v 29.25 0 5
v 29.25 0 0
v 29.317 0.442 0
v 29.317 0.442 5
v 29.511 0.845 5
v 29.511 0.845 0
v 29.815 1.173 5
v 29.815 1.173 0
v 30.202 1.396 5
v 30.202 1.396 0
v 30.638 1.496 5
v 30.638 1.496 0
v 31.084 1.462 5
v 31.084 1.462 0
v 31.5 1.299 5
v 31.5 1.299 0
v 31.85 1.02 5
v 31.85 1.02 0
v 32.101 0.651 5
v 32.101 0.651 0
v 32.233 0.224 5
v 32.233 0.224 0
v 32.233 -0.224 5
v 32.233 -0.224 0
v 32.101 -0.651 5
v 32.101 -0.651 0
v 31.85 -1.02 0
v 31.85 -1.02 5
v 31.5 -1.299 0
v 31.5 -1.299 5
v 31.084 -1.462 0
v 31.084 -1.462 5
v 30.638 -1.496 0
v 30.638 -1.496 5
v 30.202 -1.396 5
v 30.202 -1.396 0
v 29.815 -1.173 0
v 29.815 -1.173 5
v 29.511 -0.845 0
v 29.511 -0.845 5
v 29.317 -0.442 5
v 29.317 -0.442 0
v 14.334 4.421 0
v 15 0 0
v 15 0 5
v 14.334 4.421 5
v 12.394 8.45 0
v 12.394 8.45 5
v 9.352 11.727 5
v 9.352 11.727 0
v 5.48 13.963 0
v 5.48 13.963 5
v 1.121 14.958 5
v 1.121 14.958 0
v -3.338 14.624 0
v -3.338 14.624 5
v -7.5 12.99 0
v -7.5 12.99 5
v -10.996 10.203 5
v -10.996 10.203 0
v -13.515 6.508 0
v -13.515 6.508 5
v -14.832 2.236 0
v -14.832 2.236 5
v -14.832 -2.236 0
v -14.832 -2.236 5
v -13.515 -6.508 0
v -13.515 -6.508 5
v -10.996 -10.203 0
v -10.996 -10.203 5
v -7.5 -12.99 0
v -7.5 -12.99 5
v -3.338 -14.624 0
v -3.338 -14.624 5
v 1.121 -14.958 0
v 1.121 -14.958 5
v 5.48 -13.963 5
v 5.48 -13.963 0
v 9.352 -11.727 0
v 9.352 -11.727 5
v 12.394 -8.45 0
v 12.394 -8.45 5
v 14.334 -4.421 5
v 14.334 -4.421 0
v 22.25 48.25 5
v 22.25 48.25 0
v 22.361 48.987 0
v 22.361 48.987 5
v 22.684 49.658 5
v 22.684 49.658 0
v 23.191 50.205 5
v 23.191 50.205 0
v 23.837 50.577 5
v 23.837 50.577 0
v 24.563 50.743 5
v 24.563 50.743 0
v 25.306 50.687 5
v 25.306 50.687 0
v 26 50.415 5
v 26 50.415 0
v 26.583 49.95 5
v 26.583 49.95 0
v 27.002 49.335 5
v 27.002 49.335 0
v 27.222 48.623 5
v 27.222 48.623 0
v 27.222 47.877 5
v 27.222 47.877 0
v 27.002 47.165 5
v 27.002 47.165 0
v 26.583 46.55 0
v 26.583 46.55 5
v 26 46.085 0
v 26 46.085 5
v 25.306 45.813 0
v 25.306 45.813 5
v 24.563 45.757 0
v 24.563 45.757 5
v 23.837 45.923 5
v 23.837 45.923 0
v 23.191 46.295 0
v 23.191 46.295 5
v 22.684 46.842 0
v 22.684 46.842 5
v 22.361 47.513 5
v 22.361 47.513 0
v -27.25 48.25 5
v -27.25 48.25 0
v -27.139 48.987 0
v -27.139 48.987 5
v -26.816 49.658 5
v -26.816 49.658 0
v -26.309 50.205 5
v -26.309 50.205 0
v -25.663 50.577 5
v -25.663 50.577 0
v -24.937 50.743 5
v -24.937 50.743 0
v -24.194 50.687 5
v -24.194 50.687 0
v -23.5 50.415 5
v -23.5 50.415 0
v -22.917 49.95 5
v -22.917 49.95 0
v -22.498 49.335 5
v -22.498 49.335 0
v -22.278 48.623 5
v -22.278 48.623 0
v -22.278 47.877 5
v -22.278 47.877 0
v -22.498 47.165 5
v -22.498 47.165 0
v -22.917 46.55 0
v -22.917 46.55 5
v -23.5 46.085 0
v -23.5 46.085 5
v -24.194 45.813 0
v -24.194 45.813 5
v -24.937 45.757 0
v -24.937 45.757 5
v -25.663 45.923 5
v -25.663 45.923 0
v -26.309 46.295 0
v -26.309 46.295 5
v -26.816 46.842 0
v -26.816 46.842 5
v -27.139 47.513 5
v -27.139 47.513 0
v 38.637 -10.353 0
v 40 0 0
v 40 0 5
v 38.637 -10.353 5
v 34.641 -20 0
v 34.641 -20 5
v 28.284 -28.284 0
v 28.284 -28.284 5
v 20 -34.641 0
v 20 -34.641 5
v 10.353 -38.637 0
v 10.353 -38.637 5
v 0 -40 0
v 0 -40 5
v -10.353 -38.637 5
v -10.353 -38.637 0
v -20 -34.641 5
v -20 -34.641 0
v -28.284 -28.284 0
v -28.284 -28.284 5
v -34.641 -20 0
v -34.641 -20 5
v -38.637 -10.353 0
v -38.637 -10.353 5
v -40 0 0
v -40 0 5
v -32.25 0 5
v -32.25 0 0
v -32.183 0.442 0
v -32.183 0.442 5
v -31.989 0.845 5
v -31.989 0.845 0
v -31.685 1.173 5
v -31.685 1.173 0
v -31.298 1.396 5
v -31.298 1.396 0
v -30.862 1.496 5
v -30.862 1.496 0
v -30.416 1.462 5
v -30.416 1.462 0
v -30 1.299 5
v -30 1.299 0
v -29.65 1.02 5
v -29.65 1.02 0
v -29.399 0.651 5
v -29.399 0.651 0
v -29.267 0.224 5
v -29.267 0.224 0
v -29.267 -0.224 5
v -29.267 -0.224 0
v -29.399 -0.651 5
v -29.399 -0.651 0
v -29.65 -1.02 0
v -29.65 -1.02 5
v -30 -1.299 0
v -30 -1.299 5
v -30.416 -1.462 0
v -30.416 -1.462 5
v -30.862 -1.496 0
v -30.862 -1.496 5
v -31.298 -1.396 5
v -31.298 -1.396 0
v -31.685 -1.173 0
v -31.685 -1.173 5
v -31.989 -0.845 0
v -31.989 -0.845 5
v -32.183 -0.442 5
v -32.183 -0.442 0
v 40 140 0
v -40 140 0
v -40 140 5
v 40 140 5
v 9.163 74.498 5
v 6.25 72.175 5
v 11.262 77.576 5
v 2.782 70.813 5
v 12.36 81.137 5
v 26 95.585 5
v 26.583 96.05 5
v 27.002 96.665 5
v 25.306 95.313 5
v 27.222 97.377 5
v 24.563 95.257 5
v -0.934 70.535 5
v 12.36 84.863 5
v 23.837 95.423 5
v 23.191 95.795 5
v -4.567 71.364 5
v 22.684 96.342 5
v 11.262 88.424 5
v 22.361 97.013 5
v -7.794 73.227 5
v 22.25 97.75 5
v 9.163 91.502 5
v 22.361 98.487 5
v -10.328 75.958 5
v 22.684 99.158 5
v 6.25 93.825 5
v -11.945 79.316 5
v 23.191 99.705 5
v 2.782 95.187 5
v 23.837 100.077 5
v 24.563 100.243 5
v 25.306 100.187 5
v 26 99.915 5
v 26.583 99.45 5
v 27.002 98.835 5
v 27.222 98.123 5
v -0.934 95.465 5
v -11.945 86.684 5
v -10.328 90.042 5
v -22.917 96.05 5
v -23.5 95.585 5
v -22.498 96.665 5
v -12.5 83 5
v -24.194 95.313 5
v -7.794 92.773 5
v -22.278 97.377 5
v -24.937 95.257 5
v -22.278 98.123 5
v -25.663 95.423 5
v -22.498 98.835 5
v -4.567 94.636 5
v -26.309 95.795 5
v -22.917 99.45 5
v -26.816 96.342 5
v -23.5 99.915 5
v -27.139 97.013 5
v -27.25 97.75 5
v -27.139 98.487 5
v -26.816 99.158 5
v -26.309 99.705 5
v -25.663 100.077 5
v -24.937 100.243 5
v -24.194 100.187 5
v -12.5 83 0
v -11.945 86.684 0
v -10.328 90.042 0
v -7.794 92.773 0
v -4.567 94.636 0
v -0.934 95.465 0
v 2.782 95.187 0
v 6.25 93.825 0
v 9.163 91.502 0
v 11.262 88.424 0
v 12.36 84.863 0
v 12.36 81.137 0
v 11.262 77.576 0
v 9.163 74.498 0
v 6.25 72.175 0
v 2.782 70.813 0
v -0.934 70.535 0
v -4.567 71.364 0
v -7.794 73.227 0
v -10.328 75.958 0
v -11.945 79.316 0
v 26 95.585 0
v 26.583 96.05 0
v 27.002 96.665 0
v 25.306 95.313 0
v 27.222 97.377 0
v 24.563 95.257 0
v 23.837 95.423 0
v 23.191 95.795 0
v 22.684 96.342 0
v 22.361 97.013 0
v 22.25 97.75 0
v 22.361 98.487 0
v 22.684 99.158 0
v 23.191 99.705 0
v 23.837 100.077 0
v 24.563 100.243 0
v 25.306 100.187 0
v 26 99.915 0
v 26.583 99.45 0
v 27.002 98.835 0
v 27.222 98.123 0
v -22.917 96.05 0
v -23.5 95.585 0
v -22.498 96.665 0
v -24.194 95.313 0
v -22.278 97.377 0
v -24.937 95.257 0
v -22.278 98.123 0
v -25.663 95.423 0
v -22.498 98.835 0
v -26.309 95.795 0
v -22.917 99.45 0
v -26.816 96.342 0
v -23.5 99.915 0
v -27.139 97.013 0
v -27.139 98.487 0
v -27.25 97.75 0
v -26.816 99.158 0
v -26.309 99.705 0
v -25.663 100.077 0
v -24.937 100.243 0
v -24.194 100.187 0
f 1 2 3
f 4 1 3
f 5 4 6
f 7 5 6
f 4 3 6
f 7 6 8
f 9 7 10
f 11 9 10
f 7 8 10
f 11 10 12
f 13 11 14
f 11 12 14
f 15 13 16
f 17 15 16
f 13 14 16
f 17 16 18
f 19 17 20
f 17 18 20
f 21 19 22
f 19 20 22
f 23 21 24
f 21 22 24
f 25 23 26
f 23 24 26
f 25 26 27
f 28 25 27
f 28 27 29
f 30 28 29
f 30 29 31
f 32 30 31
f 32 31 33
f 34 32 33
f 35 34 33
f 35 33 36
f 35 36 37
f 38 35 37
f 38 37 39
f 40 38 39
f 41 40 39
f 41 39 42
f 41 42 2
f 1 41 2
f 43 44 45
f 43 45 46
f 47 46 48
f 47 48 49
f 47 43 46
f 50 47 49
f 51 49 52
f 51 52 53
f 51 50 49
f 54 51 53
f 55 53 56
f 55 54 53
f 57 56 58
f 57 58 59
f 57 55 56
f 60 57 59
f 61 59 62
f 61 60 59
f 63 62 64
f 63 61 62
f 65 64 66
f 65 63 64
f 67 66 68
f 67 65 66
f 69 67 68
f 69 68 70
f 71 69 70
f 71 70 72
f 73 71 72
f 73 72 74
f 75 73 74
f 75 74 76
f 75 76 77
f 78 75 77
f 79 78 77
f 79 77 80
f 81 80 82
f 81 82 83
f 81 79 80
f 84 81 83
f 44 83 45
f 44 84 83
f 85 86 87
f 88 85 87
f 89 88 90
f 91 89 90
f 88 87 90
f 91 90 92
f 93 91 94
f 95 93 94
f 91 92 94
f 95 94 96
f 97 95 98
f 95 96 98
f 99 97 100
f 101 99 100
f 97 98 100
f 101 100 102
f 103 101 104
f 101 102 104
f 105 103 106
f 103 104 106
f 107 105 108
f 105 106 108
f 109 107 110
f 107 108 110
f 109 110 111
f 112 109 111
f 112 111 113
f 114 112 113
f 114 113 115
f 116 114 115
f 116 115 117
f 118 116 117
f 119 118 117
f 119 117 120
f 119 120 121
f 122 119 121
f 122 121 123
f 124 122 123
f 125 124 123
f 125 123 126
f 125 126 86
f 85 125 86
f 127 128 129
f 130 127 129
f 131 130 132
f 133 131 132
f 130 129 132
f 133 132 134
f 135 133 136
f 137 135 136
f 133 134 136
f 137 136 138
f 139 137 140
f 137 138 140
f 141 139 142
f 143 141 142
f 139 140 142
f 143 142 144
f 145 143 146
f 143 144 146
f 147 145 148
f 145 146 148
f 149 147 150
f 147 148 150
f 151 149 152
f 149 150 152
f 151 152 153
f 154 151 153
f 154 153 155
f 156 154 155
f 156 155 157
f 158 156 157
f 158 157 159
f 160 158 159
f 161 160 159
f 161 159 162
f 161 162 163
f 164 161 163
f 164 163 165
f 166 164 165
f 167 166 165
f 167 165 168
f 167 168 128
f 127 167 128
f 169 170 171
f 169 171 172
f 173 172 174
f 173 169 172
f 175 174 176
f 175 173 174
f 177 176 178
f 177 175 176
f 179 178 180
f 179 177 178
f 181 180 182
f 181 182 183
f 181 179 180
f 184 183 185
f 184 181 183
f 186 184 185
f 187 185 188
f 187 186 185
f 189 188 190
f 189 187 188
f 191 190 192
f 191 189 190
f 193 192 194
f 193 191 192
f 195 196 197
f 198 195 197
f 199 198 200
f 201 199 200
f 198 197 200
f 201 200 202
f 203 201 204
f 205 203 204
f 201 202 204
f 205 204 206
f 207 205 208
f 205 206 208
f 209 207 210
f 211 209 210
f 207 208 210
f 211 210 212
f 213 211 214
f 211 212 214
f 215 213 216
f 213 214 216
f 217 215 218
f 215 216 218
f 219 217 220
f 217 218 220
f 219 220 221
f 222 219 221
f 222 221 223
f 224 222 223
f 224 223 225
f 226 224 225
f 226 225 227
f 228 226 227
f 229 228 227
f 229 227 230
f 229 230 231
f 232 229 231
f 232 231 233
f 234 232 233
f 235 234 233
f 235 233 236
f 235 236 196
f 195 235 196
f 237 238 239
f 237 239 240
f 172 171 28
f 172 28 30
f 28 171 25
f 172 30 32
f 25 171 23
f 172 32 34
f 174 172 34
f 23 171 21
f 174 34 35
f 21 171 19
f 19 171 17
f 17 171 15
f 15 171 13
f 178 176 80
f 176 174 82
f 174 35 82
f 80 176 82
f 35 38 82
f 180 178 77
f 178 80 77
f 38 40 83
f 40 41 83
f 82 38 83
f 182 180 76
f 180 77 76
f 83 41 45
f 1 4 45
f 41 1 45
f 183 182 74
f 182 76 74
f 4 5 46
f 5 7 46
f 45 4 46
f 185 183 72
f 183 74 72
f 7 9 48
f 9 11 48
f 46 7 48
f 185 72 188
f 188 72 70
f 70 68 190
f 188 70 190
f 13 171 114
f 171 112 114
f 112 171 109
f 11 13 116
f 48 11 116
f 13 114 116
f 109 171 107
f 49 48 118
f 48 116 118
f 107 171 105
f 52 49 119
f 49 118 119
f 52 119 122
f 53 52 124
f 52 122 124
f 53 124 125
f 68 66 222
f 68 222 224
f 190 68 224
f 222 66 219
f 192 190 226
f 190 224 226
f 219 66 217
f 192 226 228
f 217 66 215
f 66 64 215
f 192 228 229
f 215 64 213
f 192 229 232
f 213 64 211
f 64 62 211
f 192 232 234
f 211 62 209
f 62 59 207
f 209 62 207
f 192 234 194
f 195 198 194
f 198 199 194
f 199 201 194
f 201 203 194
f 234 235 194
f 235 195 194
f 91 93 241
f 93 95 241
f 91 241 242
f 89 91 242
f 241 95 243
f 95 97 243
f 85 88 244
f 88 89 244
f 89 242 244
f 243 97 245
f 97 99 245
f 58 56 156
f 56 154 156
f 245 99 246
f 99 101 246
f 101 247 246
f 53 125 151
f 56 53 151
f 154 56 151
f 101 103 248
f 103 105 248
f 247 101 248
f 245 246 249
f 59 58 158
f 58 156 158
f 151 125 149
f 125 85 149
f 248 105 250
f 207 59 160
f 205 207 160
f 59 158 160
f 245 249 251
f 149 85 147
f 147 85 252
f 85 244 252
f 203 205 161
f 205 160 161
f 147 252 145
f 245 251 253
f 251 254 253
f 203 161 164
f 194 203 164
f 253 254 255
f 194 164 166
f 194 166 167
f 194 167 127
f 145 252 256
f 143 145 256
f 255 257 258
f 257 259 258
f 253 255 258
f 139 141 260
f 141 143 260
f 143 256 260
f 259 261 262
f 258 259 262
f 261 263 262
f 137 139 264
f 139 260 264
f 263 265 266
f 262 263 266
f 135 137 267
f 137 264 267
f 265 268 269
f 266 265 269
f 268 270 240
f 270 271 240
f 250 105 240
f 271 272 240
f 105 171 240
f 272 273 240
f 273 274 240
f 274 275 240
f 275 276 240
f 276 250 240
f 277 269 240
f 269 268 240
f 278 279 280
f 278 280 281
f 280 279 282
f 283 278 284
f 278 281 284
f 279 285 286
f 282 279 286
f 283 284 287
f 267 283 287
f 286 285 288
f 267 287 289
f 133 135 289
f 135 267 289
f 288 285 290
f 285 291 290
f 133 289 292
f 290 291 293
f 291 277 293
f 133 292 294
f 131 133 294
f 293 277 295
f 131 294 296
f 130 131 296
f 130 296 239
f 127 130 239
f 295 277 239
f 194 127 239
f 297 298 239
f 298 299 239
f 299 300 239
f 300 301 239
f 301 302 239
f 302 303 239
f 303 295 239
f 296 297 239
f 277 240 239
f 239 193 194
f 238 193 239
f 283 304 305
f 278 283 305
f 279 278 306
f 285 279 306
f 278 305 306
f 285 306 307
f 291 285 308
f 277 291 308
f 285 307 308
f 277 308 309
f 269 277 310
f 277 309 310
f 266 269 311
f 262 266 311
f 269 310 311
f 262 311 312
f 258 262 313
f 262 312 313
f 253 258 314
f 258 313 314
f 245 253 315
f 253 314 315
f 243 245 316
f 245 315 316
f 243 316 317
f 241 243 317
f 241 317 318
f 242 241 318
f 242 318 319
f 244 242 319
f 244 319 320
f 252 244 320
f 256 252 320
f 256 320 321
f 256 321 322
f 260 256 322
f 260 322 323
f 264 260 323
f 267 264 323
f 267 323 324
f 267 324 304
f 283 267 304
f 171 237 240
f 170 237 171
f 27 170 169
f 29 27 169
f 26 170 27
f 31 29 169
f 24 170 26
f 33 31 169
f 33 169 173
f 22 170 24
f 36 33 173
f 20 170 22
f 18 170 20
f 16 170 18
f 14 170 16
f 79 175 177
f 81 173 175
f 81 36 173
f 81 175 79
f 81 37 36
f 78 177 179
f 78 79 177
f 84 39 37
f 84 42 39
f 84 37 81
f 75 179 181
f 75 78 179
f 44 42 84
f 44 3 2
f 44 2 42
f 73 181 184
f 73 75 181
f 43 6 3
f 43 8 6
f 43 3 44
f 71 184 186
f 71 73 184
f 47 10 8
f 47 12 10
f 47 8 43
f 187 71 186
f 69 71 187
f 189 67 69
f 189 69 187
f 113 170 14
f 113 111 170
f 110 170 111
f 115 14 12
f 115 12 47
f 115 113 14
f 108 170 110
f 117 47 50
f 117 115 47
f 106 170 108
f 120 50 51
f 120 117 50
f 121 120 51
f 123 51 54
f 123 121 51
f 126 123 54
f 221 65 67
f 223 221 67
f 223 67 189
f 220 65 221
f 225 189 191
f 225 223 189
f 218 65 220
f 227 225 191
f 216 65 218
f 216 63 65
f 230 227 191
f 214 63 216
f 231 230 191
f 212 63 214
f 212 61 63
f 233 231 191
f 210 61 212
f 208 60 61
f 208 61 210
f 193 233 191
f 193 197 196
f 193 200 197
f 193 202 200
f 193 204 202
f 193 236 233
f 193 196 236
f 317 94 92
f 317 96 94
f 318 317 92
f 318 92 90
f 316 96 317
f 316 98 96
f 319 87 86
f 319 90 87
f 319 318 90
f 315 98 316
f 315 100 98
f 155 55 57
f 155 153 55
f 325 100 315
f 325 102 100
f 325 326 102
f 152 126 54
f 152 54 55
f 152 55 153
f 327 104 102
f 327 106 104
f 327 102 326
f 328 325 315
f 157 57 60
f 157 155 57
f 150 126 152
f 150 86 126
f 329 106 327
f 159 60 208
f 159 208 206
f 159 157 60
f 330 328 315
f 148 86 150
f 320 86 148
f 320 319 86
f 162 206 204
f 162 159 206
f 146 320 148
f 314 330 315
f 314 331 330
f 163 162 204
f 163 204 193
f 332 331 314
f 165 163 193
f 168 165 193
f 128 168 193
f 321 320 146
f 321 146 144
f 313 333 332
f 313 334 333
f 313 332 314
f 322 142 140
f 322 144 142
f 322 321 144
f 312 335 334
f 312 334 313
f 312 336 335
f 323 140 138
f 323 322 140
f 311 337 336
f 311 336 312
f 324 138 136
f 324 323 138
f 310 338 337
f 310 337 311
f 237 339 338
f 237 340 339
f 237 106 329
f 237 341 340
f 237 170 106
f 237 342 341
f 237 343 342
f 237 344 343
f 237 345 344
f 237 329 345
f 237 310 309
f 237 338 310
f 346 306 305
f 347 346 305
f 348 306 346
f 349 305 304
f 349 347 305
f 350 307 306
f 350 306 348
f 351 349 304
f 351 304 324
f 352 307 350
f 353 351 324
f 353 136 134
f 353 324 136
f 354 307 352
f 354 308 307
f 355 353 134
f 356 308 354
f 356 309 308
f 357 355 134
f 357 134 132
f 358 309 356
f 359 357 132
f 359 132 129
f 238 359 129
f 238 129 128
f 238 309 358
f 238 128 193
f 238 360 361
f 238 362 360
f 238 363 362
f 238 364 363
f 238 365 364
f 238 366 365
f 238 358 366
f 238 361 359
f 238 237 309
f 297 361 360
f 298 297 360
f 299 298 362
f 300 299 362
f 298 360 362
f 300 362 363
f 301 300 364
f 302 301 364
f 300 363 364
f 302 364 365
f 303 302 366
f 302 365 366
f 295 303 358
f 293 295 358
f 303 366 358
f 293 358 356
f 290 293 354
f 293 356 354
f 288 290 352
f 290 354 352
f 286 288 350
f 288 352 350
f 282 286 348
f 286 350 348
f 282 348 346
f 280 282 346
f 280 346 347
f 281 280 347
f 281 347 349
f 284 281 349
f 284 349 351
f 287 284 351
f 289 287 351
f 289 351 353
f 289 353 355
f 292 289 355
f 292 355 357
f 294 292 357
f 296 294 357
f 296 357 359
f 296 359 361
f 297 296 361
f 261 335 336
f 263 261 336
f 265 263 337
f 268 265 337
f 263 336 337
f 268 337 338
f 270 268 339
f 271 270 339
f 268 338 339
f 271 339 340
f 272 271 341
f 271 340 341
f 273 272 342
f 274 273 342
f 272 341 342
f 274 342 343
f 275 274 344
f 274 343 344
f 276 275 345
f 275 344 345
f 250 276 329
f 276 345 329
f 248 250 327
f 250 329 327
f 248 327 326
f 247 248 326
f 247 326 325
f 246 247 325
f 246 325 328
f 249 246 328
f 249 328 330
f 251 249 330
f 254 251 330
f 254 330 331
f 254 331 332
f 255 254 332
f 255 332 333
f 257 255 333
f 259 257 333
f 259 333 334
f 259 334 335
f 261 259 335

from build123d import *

# Parameters (mm, degrees)
SKETCH1_R           = 15
BOSS_EXTRUDE1_DEPTH = 5
SKETCH2_R           = 2.5
SKETCH2_R_2         = 12.5
CUT_EXTRUDE1_DEPTH  = 146.688022843
SKETCH3_R           = 1.5
CUT_EXTRUDE2_DEPTH  = 10


with BuildPart() as part:
    # Sketch1 → Boss-Extrude1 (new body)
    with BuildSketch(Plane.XY):
        with BuildLine():
            Line((-40, 0), (-40, 140))
            Line((-40, 140), (40, 140))
            Line((40, 140), (40, 0))
            ThreePointArc((40, 0), (0, -40), (-40, 0))
        make_face()
        Circle(SKETCH1_R, mode=Mode.SUBTRACT)
    extrude(amount=BOSS_EXTRUDE1_DEPTH)

    # Sketch2 → Cut-Extrude1 (cut, through all)
    with BuildSketch(Plane(origin=(0, 0, 0), x_dir=(-1, 0, 0), z_dir=(0, 0, -1))):
        with Locations((-24.75, 97.75)):
            Circle(SKETCH2_R)
        with Locations((24.75, 97.75)):
            Circle(SKETCH2_R)
        with Locations((24.75, 48.25)):
            Circle(SKETCH2_R)
        with Locations((-24.75, 48.25)):
            Circle(SKETCH2_R)
        with Locations((0, 83)):
            Circle(SKETCH2_R_2)
    extrude(amount=-CUT_EXTRUDE1_DEPTH, mode=Mode.SUBTRACT)

    # Sketch3 → Cut-Extrude2 (cut)
    with BuildSketch(Plane(origin=(0, 0, 0), x_dir=(-1, 0, 0), z_dir=(0, 0, -1))):
        with Locations((-30.75, 0)):
            Circle(SKETCH3_R)
        with Locations((30.75, 0)):
            Circle(SKETCH3_R)
    extrude(amount=-CUT_EXTRUDE2_DEPTH, mode=Mode.SUBTRACT)


solid = part.part
